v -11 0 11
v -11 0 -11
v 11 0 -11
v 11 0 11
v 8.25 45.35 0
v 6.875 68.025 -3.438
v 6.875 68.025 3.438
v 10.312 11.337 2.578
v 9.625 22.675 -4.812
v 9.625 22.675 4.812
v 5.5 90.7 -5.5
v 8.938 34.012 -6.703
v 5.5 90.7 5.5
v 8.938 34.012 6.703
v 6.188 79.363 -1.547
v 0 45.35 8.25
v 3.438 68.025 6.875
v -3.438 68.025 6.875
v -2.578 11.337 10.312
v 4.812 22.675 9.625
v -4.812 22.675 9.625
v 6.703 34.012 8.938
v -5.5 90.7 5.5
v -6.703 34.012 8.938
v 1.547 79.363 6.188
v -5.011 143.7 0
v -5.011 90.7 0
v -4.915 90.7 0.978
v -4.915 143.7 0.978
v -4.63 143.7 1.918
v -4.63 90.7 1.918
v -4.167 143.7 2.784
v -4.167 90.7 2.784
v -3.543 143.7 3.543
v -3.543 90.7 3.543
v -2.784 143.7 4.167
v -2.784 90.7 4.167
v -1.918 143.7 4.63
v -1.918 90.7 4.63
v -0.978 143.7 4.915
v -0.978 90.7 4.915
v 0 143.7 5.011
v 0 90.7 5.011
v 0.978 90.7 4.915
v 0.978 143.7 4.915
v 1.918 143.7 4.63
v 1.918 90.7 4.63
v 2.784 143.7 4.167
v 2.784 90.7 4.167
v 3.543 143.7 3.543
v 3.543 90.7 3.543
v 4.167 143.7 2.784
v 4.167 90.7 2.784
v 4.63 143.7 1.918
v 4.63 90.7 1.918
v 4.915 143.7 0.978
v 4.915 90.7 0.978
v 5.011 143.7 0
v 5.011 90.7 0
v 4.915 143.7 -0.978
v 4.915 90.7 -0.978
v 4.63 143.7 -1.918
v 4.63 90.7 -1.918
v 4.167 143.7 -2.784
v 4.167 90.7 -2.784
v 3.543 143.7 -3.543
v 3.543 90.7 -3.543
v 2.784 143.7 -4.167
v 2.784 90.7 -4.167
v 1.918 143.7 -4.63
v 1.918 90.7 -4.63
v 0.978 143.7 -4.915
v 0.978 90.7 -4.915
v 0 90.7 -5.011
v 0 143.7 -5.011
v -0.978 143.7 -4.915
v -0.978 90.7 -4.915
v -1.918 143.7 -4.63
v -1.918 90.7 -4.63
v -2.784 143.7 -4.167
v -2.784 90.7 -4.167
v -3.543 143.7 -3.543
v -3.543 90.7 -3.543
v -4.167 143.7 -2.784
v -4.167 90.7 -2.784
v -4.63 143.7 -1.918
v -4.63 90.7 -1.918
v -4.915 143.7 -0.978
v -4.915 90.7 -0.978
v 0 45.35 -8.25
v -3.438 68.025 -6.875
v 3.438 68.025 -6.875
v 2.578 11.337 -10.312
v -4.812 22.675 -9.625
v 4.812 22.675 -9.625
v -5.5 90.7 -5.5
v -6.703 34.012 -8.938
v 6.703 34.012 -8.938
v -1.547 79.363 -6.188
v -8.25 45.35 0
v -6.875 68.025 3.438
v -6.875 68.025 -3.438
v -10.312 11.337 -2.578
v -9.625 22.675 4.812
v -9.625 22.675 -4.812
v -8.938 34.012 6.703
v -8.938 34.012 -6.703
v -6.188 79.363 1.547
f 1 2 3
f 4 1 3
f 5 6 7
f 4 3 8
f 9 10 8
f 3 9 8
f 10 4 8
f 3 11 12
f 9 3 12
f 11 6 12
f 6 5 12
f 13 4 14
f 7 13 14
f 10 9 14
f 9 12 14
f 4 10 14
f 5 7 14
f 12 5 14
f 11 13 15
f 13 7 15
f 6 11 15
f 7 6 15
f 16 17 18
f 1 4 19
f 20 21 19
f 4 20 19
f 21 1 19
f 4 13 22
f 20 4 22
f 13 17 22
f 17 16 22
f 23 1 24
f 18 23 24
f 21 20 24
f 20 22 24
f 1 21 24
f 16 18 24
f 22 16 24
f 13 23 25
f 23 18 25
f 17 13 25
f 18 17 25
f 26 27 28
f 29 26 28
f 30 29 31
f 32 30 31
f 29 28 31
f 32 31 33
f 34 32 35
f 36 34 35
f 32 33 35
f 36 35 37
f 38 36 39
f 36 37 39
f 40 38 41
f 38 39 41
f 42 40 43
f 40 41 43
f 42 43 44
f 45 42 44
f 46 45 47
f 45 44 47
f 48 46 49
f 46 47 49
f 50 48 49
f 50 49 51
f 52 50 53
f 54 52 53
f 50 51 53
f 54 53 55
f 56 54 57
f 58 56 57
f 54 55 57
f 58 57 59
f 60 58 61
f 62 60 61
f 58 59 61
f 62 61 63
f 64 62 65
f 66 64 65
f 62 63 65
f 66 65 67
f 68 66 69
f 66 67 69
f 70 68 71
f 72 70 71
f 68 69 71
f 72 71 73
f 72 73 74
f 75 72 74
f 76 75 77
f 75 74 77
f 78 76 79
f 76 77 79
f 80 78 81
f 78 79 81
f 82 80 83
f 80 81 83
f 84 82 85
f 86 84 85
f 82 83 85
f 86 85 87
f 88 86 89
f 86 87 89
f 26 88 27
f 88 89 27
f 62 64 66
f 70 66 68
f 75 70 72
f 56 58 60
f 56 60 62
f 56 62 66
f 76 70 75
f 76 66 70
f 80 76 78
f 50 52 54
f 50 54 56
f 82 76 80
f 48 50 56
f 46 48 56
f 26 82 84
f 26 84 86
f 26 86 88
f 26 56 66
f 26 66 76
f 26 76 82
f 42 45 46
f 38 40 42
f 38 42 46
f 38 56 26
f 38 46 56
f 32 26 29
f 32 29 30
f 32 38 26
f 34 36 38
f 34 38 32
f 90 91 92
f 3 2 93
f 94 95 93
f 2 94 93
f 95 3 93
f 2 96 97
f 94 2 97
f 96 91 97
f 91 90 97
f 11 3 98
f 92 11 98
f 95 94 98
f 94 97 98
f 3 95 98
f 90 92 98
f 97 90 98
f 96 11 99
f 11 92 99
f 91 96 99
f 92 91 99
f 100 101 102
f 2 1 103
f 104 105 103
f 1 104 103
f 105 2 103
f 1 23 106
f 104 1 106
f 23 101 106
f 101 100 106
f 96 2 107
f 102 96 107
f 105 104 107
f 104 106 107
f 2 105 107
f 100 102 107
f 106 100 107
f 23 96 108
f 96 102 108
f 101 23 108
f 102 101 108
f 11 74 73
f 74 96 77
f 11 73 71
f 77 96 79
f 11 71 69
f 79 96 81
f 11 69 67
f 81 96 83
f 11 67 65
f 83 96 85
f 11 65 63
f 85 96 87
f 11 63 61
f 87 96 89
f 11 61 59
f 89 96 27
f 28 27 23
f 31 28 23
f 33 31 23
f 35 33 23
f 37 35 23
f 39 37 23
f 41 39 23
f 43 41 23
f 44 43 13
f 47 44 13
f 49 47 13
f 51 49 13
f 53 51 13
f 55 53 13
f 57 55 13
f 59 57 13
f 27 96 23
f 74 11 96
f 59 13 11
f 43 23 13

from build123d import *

# Parameters (mm, degrees)
F0_W     = 22
F0_H     = 22
F2_W     = 11
F2_H     = 11
F4_R     = 5.011147
F5_DEPTH = 53


with BuildPart() as f3:
    # F0 (on Front) → F3 section 0
    with BuildSketch(Plane.XZ):
        Rectangle(F0_W, F0_H)
    # F2 (on offset) → F3 section 1
    with BuildSketch(Plane.XZ.offset(-90.7)):
        Rectangle(F2_W, F2_H)
    loft()

    # F4 (on face) → F5 (join)
    with BuildSketch(Plane(origin=(0, 90.7, 0), x_dir=(-1, 0, 0), z_dir=(0, 1, 0))):
        Circle(F4_R)
    extrude(amount=F5_DEPTH)


solid = f3.part
